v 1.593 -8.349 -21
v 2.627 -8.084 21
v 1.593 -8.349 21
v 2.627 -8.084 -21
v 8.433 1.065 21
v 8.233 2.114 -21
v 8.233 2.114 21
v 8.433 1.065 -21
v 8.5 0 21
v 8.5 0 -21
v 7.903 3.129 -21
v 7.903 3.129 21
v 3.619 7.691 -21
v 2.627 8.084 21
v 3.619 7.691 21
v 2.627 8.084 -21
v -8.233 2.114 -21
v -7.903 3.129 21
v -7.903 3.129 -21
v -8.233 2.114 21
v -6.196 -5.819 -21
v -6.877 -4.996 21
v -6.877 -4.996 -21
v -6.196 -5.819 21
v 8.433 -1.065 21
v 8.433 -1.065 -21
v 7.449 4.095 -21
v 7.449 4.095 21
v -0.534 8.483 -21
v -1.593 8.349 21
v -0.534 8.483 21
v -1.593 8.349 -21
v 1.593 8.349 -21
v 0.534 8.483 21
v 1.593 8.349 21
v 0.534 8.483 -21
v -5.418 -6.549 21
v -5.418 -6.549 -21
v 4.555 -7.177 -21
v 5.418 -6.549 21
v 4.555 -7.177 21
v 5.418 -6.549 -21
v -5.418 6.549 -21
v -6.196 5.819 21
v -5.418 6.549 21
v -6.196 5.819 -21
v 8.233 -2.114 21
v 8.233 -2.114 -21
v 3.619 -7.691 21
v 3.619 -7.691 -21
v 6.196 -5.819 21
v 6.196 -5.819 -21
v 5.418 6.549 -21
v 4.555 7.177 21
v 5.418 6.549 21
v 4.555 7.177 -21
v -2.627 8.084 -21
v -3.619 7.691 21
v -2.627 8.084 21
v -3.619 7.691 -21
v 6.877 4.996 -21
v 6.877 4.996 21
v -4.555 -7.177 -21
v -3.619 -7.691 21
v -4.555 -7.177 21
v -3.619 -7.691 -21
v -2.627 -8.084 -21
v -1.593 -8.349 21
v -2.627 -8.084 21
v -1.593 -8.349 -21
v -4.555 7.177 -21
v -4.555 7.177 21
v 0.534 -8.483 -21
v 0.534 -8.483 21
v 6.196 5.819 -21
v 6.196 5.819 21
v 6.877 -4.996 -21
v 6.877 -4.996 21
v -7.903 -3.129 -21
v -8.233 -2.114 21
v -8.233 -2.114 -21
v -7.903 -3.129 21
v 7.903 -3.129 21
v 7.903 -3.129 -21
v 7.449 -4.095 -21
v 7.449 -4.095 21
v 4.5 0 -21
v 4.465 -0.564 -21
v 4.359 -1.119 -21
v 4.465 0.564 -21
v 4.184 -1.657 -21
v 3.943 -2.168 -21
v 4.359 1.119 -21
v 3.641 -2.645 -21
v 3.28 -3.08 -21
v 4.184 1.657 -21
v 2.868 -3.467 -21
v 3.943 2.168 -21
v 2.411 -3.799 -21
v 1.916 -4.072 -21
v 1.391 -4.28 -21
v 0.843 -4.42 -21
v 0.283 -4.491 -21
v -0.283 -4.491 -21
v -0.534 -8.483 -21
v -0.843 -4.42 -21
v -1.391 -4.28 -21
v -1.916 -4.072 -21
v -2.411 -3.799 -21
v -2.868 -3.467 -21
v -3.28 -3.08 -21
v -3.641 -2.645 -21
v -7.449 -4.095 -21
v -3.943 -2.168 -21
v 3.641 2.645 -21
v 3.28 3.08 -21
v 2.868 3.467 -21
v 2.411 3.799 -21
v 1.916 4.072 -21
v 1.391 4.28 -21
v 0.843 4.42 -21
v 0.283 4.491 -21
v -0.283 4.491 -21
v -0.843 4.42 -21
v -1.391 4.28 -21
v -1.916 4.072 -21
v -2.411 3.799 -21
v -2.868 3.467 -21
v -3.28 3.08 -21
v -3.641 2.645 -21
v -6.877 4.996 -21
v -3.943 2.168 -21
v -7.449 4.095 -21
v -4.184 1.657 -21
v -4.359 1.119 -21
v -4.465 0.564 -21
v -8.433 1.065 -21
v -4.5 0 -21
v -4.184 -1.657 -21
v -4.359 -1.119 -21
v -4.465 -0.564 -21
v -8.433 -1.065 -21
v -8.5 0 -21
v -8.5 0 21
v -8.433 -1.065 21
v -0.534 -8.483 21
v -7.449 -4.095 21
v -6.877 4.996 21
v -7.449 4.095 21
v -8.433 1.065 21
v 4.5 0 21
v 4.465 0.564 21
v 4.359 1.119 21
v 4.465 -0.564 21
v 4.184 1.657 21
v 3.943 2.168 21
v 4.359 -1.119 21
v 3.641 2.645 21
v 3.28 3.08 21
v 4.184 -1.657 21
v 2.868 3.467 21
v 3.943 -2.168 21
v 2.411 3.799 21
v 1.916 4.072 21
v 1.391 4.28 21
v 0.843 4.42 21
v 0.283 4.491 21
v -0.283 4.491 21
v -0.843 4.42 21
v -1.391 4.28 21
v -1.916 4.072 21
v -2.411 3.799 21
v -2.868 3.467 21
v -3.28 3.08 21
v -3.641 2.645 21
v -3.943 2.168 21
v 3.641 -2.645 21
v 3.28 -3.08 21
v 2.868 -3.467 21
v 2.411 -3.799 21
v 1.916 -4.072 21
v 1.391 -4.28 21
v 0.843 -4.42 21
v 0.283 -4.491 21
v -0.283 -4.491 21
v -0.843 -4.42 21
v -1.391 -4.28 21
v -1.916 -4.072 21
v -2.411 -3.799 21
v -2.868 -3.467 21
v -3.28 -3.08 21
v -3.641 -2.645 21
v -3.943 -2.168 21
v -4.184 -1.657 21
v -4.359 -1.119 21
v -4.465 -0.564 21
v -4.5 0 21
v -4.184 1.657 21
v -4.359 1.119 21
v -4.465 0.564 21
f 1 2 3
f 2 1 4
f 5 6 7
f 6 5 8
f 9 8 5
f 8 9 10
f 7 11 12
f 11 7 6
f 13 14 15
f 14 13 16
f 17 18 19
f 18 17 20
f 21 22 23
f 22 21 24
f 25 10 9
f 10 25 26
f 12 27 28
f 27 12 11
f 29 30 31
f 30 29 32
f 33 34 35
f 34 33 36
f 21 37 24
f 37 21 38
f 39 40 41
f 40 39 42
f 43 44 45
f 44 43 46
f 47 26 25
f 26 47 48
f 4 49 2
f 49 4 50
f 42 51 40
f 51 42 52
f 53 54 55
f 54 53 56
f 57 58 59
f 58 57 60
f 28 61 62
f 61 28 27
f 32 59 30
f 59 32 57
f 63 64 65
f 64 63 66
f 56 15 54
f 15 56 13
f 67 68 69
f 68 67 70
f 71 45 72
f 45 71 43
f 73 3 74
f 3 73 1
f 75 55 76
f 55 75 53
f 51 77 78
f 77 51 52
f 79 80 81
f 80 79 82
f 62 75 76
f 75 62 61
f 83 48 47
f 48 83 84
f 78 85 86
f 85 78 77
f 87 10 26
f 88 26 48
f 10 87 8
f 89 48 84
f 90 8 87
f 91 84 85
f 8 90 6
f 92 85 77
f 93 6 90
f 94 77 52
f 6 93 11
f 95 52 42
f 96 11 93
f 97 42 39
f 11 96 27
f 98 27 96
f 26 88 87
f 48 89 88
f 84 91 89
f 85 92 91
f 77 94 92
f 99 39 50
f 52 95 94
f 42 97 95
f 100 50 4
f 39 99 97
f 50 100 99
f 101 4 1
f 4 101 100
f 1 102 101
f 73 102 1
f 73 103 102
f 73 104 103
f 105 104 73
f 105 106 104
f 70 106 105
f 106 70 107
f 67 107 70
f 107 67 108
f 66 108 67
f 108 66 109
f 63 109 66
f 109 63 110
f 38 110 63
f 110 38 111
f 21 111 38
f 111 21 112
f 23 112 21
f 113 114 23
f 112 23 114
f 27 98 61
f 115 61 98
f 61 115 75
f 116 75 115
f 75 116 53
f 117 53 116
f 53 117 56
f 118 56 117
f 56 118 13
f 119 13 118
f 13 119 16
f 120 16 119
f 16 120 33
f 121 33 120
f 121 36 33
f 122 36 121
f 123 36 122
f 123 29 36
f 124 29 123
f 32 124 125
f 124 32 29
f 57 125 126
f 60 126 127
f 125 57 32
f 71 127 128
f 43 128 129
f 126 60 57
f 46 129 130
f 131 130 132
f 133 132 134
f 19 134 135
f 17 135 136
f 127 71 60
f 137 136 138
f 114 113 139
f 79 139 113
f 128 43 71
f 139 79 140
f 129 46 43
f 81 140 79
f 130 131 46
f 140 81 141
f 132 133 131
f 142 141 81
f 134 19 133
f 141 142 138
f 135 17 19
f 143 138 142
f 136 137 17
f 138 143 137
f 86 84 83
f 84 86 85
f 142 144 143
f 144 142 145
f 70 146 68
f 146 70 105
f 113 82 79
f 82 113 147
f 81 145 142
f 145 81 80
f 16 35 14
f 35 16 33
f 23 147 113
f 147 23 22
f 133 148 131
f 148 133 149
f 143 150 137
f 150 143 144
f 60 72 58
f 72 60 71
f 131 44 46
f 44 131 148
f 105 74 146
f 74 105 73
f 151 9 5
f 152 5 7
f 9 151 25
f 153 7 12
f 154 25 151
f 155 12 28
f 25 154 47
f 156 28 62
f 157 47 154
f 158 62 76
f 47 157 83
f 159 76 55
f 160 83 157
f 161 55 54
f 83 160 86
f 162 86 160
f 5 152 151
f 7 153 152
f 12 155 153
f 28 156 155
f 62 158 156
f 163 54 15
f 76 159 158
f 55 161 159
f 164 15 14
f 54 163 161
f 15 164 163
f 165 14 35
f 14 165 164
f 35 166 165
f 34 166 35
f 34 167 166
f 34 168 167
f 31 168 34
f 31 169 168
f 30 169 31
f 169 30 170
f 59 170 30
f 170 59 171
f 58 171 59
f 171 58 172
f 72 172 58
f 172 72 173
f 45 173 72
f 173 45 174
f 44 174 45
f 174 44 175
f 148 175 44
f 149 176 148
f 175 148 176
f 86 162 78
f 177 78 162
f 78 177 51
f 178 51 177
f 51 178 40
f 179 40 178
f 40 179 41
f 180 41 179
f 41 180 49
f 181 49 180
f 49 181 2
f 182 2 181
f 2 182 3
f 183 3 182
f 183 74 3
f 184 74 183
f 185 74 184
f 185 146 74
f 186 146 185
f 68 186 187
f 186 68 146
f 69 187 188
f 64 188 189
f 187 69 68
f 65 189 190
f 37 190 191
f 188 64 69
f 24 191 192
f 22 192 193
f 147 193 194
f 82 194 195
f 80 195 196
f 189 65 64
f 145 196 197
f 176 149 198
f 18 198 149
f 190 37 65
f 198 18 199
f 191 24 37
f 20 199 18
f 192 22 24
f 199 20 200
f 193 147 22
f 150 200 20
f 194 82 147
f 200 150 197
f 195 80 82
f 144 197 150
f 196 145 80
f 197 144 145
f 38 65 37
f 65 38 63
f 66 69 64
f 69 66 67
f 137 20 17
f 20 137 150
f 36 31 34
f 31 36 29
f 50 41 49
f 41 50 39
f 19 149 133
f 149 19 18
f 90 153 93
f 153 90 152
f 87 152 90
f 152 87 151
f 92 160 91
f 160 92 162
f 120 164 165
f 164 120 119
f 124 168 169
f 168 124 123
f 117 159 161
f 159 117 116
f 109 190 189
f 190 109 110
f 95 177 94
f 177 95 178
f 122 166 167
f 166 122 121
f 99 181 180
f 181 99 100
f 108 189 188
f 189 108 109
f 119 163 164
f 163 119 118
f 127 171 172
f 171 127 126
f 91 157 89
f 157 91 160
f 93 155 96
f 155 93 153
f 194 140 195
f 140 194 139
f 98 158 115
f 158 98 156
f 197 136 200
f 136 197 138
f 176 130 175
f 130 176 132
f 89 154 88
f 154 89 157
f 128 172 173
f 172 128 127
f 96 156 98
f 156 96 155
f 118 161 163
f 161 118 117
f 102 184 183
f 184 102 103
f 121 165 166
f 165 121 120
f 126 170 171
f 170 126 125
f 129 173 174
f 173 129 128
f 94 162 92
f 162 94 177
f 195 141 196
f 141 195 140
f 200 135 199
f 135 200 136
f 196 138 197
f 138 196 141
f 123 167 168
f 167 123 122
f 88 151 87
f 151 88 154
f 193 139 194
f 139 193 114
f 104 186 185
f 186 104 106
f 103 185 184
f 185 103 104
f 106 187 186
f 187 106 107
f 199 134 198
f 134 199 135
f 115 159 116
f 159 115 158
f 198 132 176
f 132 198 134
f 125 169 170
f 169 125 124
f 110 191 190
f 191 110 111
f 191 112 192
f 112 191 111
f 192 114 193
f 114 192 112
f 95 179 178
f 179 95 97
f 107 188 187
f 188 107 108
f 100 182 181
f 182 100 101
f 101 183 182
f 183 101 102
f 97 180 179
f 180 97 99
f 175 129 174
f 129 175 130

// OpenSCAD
$fn = 50;


difference() {
	union() {
		translate(v = [0, 0, -21.0000000000]) {
			cylinder(h = 42, r = 8.5000000000);
		}
	}
	union() {
		translate(v = [0, 0, -100.0000000000]) {
			cylinder(h = 200, r = 4.5000000000);
		}
	}
}
